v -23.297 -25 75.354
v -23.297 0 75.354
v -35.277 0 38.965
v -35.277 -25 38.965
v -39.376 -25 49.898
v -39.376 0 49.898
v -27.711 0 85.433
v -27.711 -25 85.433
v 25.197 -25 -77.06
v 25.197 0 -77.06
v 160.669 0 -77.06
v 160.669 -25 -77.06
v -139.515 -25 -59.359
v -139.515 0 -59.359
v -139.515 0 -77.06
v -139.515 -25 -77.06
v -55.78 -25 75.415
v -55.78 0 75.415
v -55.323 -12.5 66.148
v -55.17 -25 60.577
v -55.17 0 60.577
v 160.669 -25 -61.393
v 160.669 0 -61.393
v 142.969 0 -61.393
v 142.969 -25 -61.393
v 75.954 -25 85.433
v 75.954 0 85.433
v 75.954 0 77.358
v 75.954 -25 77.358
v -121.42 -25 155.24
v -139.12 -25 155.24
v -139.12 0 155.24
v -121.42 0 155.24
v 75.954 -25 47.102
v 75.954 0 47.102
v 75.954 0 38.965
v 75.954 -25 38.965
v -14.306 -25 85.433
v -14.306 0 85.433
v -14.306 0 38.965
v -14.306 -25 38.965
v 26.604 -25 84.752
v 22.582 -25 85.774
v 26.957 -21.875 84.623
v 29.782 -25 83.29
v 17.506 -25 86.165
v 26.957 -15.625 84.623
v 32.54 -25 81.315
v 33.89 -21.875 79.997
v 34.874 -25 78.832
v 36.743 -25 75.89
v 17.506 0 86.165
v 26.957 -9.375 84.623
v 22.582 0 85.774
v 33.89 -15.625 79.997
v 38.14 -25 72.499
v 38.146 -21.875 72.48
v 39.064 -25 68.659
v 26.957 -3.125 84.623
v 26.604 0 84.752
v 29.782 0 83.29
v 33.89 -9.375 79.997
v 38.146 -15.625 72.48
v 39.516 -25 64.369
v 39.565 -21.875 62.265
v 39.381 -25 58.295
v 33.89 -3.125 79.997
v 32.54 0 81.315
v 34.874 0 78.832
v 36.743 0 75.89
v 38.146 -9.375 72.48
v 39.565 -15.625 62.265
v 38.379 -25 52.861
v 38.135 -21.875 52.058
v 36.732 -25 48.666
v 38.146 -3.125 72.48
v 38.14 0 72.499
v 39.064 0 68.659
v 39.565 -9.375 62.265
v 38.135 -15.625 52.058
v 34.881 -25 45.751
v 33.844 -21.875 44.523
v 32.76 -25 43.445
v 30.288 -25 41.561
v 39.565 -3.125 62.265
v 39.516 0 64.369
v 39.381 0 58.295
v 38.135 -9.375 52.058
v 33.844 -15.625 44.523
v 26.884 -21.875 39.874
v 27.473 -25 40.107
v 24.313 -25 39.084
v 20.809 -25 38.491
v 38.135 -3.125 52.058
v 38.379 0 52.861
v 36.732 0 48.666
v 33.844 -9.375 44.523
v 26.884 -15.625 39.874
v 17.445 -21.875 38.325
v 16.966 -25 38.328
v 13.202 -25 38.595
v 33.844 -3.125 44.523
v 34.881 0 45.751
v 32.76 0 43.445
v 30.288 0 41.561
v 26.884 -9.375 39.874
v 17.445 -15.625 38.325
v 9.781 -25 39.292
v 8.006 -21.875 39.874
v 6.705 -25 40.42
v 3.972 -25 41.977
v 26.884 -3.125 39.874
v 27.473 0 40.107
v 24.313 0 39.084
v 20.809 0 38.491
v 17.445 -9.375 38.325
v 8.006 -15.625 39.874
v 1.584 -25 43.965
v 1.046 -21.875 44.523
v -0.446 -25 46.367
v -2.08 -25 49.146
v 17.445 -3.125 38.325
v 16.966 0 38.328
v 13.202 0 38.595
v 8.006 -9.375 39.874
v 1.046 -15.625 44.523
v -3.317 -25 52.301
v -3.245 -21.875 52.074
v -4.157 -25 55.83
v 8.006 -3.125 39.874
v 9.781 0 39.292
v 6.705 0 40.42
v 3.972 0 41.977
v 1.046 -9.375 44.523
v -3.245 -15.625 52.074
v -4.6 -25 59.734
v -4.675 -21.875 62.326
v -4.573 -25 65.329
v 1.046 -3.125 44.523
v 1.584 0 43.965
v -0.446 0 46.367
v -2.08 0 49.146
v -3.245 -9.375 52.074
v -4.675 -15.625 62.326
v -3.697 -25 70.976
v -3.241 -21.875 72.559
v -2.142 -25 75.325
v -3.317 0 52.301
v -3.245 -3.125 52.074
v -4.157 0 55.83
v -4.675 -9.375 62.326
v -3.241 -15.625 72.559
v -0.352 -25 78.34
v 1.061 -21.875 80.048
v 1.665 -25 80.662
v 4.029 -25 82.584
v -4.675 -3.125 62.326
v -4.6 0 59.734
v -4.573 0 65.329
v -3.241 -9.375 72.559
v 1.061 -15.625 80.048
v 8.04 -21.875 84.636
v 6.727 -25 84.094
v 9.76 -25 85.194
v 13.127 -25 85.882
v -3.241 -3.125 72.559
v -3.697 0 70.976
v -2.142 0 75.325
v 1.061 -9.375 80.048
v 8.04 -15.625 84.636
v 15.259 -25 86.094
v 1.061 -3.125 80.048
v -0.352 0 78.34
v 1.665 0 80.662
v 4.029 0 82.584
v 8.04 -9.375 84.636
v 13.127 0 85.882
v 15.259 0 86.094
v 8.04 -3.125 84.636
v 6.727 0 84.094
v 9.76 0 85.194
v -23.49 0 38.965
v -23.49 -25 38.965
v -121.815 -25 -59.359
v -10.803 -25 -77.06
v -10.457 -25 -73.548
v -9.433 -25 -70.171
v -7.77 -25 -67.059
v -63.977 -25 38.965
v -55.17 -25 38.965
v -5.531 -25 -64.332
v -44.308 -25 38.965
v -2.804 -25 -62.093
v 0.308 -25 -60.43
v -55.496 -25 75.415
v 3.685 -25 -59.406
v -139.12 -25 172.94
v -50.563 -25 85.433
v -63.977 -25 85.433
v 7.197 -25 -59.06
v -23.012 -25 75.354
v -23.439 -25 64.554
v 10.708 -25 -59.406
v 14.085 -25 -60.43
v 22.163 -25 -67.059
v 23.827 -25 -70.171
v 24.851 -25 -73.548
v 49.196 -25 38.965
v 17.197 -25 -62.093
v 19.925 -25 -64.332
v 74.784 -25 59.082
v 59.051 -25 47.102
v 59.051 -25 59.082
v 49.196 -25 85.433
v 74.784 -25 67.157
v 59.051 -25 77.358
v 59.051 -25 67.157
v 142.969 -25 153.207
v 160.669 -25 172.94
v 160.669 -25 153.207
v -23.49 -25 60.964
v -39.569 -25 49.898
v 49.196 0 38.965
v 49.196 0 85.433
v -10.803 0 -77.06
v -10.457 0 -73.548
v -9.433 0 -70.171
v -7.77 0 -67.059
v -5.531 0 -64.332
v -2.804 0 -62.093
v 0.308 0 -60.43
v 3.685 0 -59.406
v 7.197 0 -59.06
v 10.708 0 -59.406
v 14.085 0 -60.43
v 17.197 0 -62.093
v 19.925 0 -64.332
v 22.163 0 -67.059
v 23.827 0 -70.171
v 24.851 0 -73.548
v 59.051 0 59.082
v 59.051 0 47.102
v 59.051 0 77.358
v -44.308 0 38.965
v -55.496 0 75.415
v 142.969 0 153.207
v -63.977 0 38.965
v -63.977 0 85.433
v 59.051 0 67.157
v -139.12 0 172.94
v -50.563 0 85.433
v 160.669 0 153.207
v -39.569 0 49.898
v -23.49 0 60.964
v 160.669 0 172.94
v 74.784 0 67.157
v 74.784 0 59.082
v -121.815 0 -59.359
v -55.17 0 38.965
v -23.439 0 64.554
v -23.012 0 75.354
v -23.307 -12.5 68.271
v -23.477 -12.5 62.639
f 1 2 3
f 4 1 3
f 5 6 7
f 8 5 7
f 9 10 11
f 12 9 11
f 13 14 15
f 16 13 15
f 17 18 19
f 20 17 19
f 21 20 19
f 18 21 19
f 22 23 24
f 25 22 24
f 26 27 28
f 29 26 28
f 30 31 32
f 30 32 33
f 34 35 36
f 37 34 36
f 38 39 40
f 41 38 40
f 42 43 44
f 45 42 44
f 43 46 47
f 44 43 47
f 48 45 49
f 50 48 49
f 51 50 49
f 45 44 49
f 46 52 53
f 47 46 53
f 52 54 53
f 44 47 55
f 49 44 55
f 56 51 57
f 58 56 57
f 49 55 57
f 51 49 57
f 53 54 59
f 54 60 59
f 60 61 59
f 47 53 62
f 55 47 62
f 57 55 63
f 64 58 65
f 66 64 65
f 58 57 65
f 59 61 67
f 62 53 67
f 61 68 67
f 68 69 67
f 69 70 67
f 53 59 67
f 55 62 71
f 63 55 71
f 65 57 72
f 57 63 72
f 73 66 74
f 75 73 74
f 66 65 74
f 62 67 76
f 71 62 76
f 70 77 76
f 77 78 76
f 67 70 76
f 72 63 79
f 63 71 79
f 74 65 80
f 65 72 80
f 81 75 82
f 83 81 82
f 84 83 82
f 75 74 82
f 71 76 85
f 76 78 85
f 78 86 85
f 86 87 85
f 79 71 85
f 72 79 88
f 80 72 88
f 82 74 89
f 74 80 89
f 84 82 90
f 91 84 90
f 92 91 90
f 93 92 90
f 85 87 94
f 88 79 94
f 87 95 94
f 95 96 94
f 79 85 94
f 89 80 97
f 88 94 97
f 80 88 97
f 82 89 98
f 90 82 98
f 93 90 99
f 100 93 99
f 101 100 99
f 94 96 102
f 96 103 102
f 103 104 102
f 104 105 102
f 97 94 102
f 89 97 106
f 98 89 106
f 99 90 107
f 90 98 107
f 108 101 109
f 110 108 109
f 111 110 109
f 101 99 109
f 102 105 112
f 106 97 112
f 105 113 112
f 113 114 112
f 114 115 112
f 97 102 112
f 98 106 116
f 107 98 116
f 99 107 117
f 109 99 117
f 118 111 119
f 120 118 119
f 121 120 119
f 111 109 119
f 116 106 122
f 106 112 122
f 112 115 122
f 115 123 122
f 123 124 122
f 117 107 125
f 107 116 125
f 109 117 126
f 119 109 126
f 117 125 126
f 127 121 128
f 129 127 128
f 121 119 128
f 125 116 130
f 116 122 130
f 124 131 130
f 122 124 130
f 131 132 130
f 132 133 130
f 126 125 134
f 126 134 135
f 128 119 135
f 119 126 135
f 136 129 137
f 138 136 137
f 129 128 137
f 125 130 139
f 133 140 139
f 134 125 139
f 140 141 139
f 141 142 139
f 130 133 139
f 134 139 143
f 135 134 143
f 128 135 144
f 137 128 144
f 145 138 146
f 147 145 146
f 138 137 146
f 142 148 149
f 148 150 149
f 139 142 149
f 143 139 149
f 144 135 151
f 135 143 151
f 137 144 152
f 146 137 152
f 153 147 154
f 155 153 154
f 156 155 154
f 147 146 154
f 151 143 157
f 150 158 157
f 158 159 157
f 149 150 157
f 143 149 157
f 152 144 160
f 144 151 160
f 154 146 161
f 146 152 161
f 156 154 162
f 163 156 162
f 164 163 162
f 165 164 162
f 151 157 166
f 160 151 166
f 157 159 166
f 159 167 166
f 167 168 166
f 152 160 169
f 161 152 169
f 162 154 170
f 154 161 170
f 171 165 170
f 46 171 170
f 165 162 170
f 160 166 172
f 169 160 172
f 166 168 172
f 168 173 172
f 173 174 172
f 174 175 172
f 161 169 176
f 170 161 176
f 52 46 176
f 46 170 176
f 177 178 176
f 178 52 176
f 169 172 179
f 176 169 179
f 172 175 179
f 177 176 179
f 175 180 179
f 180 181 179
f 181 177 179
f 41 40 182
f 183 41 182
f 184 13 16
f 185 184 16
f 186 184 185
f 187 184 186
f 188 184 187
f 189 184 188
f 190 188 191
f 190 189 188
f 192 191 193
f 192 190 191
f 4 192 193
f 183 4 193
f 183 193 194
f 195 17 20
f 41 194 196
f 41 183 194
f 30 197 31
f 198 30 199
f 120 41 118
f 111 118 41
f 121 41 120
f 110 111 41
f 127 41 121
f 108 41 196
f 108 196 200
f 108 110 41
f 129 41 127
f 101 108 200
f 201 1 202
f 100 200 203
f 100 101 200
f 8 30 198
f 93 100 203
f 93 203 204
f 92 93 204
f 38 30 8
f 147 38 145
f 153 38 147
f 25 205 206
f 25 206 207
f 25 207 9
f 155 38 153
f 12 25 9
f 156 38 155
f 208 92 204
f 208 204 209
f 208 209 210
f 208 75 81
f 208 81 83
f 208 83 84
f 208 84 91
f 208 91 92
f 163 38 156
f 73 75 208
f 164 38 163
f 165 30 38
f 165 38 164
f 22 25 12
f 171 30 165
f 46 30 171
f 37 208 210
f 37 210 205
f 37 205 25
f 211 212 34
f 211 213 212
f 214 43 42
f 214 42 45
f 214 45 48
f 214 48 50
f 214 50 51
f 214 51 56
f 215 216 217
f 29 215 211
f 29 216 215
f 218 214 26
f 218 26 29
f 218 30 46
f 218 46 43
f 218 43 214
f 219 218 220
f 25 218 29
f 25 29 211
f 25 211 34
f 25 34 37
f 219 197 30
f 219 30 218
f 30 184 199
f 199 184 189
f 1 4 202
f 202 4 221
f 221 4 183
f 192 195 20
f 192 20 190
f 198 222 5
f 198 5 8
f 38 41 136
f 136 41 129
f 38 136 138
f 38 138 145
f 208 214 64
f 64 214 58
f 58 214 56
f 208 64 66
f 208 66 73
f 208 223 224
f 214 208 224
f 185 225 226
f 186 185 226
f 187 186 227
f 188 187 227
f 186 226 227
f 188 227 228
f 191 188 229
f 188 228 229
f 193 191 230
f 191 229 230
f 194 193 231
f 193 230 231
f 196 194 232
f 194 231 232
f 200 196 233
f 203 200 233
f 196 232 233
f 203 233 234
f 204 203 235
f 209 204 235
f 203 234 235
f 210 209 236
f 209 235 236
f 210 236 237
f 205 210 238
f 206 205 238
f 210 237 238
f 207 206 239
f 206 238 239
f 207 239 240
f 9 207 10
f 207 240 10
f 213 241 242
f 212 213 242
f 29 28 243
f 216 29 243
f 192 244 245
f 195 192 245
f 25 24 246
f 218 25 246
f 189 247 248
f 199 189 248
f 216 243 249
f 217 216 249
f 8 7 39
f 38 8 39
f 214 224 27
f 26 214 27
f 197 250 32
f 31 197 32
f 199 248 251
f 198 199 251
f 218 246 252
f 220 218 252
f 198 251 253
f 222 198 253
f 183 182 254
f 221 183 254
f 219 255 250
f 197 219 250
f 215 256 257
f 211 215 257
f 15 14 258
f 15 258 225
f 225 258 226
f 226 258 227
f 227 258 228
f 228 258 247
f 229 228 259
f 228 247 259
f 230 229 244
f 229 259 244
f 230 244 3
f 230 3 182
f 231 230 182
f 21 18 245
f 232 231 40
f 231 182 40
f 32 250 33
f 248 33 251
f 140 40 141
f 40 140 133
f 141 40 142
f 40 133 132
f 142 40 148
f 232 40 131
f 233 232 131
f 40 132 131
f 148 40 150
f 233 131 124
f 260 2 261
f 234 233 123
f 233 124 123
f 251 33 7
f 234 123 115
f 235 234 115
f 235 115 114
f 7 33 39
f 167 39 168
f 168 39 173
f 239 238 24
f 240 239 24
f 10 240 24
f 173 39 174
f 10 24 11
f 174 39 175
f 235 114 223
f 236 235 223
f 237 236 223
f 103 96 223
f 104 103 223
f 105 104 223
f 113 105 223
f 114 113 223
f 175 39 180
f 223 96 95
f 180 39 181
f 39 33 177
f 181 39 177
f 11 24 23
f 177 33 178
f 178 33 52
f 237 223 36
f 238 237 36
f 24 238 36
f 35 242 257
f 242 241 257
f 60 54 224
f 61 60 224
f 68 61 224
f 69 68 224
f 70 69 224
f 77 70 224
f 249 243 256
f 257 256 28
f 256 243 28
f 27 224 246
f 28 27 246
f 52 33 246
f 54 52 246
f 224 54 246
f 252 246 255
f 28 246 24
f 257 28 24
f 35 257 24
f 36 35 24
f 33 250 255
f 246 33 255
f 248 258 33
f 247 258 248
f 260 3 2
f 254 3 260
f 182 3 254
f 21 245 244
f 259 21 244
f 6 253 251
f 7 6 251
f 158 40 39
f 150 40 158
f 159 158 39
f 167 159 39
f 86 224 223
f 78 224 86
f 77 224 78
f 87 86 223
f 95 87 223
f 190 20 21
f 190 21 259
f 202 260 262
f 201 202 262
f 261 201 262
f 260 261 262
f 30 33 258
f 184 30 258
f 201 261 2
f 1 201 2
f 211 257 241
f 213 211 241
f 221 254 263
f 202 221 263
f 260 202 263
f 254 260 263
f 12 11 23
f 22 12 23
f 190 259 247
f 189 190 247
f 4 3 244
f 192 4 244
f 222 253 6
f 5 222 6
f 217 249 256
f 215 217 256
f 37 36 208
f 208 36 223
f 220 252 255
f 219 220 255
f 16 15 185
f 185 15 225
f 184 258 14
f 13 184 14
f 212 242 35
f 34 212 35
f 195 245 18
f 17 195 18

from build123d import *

# Parameters (mm, degrees)
F1_DEPTH = 25


with BuildPart() as f1:
    # F0 (on Front) → F1 (new body)
    with BuildSketch(Plane.XZ):
        with BuildLine():
            Line((25.196740713, -77.0597371716), (142.969147649, -77.0597371716))
            Line((142.969147649, -77.0597371716), (160.669147649, -77.0597371716))
            Line((160.669147649, -77.0597371716), (160.669147649, -61.3928571429))
            Line((160.669147649, -61.3928571429), (142.969147649, -61.3928571429))
            Line((142.969147649, -61.3928571429), (142.969147649, 153.2071428571))
            Line((142.969147649, 153.2071428571), (160.669147649, 153.2071428571))
            Line((160.669147649, 153.2071428571), (160.669147649, 172.9402628284))
            Line((160.669147649, 172.9402628284), (142.969147649, 172.9402628284))
            Line((142.969147649, 172.9402628284), (21.10726993, 172.9402628284))
            Line((21.10726993, 172.9402628284), (-28.89273007, 172.9402628284))
            Line((-28.89273007, 172.9402628284), (-121.4202080463, 172.9402628284))
            Line((-121.4202080463, 172.9402628284), (-139.1202080463, 172.9402628284))
            Line((-139.1202080463, 172.9402628284), (-139.1202080463, 155.2402628284))
            Line((-139.1202080463, 155.2402628284), (-121.4202080463, 155.2402628284))
            Line((-121.4202080463, 155.2402628284), (-121.8146599785, -59.3593746542))
            Line((-121.8146599785, -59.3593746542), (-139.5146599785, -59.3593746542))
            Line((-139.5146599785, -59.3593746542), (-139.5146599785, -77.0597371716))
            Line((-139.5146599785, -77.0597371716), (-121.630852351, -77.0597371716))
            Line((-121.630852351, -77.0597371716), (-10.803259287, -77.0597371716))
            ThreePointArc((-10.803259287, -77.0597371716), (7.196740713, -59.0597371716), (25.196740713, -77.0597371716))
        make_face()
        with BuildLine():
            Line((-35.2772239302, 38.9654661138), (-44.3083446842, 38.9654661138))
            Line((-44.3083446842, 38.9654661138), (-55.4955438163, 75.4153949225))
            Line((-55.4955438163, 75.4153949225), (-55.7803088852, 75.4153949225))
            add(Edge.make_bspline(
                [(-55.7803088852, 75.4153949225), (-55.1700980234, 64.2993870576), (-55.1700980234, 60.5771008009)],
                knots=[0, 0, 0, 1, 1, 1], degree=2))
            Line((-55.1700980234, 60.5771008009), (-55.1700980234, 38.9654661138))
            Line((-55.1700980234, 38.9654661138), (-63.9774747947, 38.9654661138))
            Line((-63.9774747947, 38.9654661138), (-63.9774747947, 85.4330232363))
            Line((-63.9774747947, 85.4330232363), (-50.5630060172, 85.4330232363))
            Line((-50.5630060172, 85.4330232363), (-39.5690403246, 49.8984107202))
            Line((-39.5690403246, 49.8984107202), (-39.375806885, 49.8984107202))
            Line((-39.375806885, 49.8984107202), (-27.7106092445, 85.4330232363))
            Line((-27.7106092445, 85.4330232363), (-14.306310648, 85.4330232363))
            Line((-14.306310648, 85.4330232363), (-14.306310648, 38.9654661138))
            Line((-14.306310648, 38.9654661138), (-23.4899841174, 38.9654661138))
            Line((-23.4899841174, 38.9654661138), (-23.4899841174, 60.96356768))
            add(Edge.make_bspline(
                [(-23.4899841174, 60.96356768), (-23.4899841174, 62.5196053775), (-23.4391332122, 64.5536415833)],
                knots=[0, 0, 0, 1, 1, 1], degree=2))
            add(Edge.make_bspline(
                [(-23.4391332122, 64.5536415833), (-23.3882823071, 66.5876777892), (-23.011985609, 75.3543738363)],
                knots=[0, 0, 0, 1, 1, 1], degree=2))
            Line((-23.011985609, 75.3543738363), (-23.2967506778, 75.3543738363))
            Line((-23.2967506778, 75.3543738363), (-35.2772239302, 38.9654661138))
        make_face(mode=Mode.SUBTRACT)
        with BuildLine():
            add(Edge.make_bspline(
                [(33.8901772495, 79.9970614762), (39.5651382638, 73.828846682), (39.5651382638, 62.2653508517)],
                knots=[0, 0, 0, 1, 1, 1], degree=2))
            add(Edge.make_bspline(
                [(39.5651382638, 62.2653508517), (39.5651382638, 50.7221953836), (33.8444114349, 44.5234700463)],
                knots=[0, 0, 0, 1, 1, 1], degree=2))
            add(Edge.make_bspline(
                [(33.8444114349, 44.5234700463), (28.1236846059, 38.3247447089), (17.4449945252, 38.3247447089)],
                knots=[0, 0, 0, 1, 1, 1], degree=2))
            add(Edge.make_bspline(
                [(17.4449945252, 38.3247447089), (6.7663044446, 38.3247447089), (1.0455776156, 44.5234700463)],
                knots=[0, 0, 0, 1, 1, 1], degree=2))
            add(Edge.make_bspline(
                [(1.0455776156, 44.5234700463), (-4.6751492133, 50.7221953836), (-4.6751492133, 62.3263719379)],
                knots=[0, 0, 0, 1, 1, 1], degree=2))
            add(Edge.make_bspline(
                [(-4.6751492133, 62.3263719379), (-4.6751492133, 73.9305484922), (1.0608328872, 80.0479123813)],
                knots=[0, 0, 0, 1, 1, 1], degree=2))
            add(Edge.make_bspline(
                [(1.0608328872, 80.0479123813), (6.7968149877, 86.1652762704), (17.5060156114, 86.1652762704)],
                knots=[0, 0, 0, 1, 1, 1], degree=2))
            add(Edge.make_bspline(
                [(17.5060156114, 86.1652762704), (28.2152162352, 86.1652762704), (33.8901772495, 79.9970614762)],
                knots=[0, 0, 0, 1, 1, 1], degree=2))
        make_face(mode=Mode.SUBTRACT)
        Polygon((75.9540459864, 47.1016109372), (75.9540459864, 38.9654661138), (49.1962996985, 38.9654661138), (49.1962996985, 85.4330232363), (75.9540459864, 85.4330232363), (75.9540459864, 77.3578994991), (59.0512051158, 77.3578994991), (59.0512051158, 67.1572079268), (74.784475168, 67.1572079268), (74.784475168, 59.0820841896), (59.0512051158, 59.0820841896), (59.0512051158, 47.1016109372), align=None, mode=Mode.SUBTRACT)
    extrude(amount=F1_DEPTH)


solid = f1.part
